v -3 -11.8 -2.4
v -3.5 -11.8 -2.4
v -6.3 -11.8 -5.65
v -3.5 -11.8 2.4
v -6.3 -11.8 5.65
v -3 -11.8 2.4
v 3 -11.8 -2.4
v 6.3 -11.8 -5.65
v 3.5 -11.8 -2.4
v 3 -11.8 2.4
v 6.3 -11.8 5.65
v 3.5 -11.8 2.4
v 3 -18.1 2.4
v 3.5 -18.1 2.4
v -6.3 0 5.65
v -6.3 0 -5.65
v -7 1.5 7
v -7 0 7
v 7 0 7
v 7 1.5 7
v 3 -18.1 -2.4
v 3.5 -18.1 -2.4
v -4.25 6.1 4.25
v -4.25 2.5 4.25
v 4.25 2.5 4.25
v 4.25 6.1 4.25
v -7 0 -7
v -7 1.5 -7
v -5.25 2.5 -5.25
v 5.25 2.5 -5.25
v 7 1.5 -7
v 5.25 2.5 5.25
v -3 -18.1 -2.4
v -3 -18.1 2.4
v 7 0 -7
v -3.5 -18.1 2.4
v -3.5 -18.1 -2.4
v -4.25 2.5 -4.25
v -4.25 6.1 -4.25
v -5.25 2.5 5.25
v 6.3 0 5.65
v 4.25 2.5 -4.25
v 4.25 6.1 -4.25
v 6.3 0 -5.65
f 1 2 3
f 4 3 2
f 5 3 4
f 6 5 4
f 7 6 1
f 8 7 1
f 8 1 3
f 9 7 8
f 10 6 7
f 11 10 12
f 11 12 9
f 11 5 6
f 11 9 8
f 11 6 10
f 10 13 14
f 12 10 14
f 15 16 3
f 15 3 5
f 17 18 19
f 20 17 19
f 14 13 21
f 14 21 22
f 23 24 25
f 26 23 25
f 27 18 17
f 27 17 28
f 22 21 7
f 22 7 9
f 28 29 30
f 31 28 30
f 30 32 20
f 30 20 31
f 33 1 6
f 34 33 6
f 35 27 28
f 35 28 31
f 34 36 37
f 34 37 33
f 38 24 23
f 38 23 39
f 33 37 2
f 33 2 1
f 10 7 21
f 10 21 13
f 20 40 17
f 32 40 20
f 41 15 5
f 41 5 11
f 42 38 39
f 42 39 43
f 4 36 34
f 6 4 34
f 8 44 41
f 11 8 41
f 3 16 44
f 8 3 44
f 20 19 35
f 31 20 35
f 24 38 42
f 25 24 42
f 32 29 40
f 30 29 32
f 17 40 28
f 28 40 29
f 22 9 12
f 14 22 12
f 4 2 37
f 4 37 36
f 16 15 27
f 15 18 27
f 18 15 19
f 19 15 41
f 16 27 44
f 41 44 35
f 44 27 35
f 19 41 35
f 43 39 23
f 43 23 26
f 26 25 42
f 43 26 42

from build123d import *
from OCP.BRepFilletAPI import BRepFilletAPI_MakeChamfer

# Parameters (mm, degrees)
BEZEL_DRAWING_W     = 14
BEZEL_DRAWING_H     = 14
BEZEL_DEPTH         = 2.5
CHAMFER1_SIZE       = 1
CHAMFER1_SIZE2      = 1.75
SKETCH2_W           = 8.5
SKETCH2_H           = 8.5
BOSS_EXTRUDE2_DEPTH = 3.6
SKETCH3_W           = 12.6
SKETCH3_H           = 11.3
BOSS_EXTRUDE3_DEPTH = 11.8
SKETCH4_W           = 0.5
SKETCH4_H           = 4.8
BOSS_EXTRUDE4_DEPTH = 6.3


with BuildPart() as part:
    # Bezel drawing → Bezel (new body)
    with BuildSketch(Plane(origin=(0, 0, 0), x_dir=(1, 0, 0), z_dir=(0, 1, 0))):
        Rectangle(BEZEL_DRAWING_W, BEZEL_DRAWING_H)
    extrude(amount=BEZEL_DEPTH)

    # Chamfer1: one chamfer whose edges measure the first distance from different faces: ONE call of the kernel's chamfer builder (chamfer() names one face for all edges)
    chamfer1_edges_1 = [part.edges().sort_by_distance(p)[0] for p in [
        (-7, 2.5, 0),
    ]]
    chamfer1_side_1 = [part.faces().sort_by_distance(p)[0] for p in [
        (-7, 1.25, 0),
    ]]
    chamfer1_edges_2 = [part.edges().sort_by_distance(p)[0] for p in [
        (0, 2.5, 7),
    ]]
    chamfer1_side_2 = [part.faces().sort_by_distance(p)[0] for p in [
        (0, 1.25, 7),
    ]]
    chamfer1_edges_3 = [part.edges().sort_by_distance(p)[0] for p in [
        (7, 2.5, 0),
    ]]
    chamfer1_side_3 = [part.faces().sort_by_distance(p)[0] for p in [
        (7, 1.25, 0),
    ]]
    chamfer1_edges_4 = [part.edges().sort_by_distance(p)[0] for p in [
        (0, 2.5, -7),
    ]]
    chamfer1_side_4 = [part.faces().sort_by_distance(p)[0] for p in [
        (0, 1.25, -7),
    ]]
    chamfer1 = BRepFilletAPI_MakeChamfer(part.part.solid().wrapped)
    for e in chamfer1_edges_1:
        chamfer1.Add(CHAMFER1_SIZE, CHAMFER1_SIZE2, e.wrapped, chamfer1_side_1[0].wrapped)  # the first distance lies on this face
    for e in chamfer1_edges_2:
        chamfer1.Add(CHAMFER1_SIZE, CHAMFER1_SIZE2, e.wrapped, chamfer1_side_2[0].wrapped)  # the first distance lies on this face
    for e in chamfer1_edges_3:
        chamfer1.Add(CHAMFER1_SIZE, CHAMFER1_SIZE2, e.wrapped, chamfer1_side_3[0].wrapped)  # the first distance lies on this face
    for e in chamfer1_edges_4:
        chamfer1.Add(CHAMFER1_SIZE, CHAMFER1_SIZE2, e.wrapped, chamfer1_side_4[0].wrapped)  # the first distance lies on this face
    add(Compound.cast(chamfer1.Shape()), mode=Mode.REPLACE)

    # Sketch3 → Boss-Extrude3 (add)
    with BuildSketch(Plane.XZ):
        Rectangle(SKETCH3_W, SKETCH3_H)
    extrude(amount=BOSS_EXTRUDE3_DEPTH)

    # Sketch4 → Boss-Extrude4 (add)
    with BuildSketch(Plane.XZ.offset(11.8)):
        with Locations((-3.25, 0)):
            Rectangle(SKETCH4_W, SKETCH4_H)
        with Locations((3.25, 0)):
            Rectangle(SKETCH4_W, SKETCH4_H)
    extrude(amount=BOSS_EXTRUDE4_DEPTH)


with BuildPart() as body_2:
    # Sketch2 → Boss-Extrude2 (new body)
    with BuildSketch(Plane(origin=(0, 2.5, 0), x_dir=(1, 0, 0), z_dir=(0, 1, 0))):
        Rectangle(SKETCH2_W, SKETCH2_H)
    extrude(amount=BOSS_EXTRUDE2_DEPTH)


solid = Compound([part.part, body_2.part])
